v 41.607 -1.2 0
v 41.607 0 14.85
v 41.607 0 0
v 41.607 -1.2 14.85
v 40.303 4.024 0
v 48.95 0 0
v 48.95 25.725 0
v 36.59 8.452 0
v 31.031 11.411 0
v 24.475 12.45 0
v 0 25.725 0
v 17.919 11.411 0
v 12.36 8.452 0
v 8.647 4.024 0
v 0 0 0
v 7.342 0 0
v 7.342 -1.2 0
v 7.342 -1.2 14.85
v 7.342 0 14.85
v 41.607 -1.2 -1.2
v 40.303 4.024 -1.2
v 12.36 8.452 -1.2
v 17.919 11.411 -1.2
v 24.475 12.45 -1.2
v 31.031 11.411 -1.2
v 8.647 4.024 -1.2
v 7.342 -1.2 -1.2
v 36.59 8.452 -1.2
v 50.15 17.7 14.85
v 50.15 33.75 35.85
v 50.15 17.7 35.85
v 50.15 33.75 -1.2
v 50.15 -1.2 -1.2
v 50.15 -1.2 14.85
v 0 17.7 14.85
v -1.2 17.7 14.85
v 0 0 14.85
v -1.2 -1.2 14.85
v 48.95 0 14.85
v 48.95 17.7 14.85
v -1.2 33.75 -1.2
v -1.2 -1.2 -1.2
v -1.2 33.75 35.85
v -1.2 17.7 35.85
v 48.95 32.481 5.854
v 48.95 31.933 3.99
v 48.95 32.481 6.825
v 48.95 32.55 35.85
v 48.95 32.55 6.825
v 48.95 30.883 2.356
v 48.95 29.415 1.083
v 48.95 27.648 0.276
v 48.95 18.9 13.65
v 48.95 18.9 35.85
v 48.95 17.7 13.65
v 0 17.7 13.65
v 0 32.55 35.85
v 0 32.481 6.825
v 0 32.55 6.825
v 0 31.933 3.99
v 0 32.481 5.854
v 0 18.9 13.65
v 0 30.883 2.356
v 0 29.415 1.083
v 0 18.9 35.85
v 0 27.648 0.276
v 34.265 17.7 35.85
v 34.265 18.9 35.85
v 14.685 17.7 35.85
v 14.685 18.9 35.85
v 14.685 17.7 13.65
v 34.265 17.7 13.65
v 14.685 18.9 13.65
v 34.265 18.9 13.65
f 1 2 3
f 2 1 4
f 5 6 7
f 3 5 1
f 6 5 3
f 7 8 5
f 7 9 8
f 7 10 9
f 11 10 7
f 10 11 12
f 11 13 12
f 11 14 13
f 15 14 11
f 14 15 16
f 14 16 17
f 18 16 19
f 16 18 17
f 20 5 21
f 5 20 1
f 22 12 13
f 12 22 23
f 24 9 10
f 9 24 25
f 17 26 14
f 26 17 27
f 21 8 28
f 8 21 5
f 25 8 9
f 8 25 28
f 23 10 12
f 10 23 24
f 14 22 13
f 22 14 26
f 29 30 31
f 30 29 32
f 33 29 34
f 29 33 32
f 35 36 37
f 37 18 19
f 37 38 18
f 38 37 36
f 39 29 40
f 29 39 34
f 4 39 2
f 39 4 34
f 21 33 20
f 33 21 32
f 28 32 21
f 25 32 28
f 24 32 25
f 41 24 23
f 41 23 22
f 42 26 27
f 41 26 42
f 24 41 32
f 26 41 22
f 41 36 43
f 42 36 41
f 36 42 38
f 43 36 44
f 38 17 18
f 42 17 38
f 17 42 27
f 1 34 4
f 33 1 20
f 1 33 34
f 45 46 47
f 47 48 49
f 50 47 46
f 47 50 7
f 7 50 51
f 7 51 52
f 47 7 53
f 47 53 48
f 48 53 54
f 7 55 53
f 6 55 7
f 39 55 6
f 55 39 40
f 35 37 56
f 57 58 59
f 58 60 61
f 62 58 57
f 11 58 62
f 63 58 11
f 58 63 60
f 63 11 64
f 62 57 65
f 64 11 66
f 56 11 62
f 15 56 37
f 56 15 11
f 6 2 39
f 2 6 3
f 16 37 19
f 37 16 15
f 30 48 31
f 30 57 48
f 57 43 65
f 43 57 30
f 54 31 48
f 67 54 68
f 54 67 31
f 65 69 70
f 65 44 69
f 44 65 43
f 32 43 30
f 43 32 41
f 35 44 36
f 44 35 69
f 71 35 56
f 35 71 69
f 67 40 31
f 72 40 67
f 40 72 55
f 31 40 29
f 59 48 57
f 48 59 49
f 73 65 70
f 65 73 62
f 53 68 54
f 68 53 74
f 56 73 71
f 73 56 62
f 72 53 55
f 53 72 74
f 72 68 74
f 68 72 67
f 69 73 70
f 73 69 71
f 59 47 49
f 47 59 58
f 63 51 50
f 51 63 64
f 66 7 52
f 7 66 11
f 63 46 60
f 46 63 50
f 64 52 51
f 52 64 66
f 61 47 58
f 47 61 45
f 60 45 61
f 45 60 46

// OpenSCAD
// What is the length of the cylindrical object being stored OR what is the width you want the dispenser of little thingies to be (mm)?
obj_len = 44.5;

// What is the diameter of each cylindrical object OR what is the size of the little thingies (mm)?
obj_dia = 10.5;

// How many cylinders/thingies tall should the hopper be? The hopper can hold about depth*height cylinders.
hopper_height = 3; // [2:50]

// How many cylinders/thingies deep should the hopper be?
hopper_depth = 1; // [1:15]

// How many cylinders/thingies deep should the tray be?
num_tray = 1; // [1:15]

// How much extra margin do you want around the cylinders/thingies in the Y/Z axes? 
obj_dia_margin_percentage = 30; // [0:100]
obj_dia_margin = obj_dia_margin_percentage/100;

// How much extra margin do you want around the cylinders/thingies in the X axis? 
obj_len_margin_percentage = 10; // [0:100]
obj_len_margin = obj_len_margin_percentage/100;

// Thickness of the walls, increase for more strength but requiring more material (mm). 
wall_thickness = 1.2;

// What percentage of the hopper front should be open? Set to zero if storing little thingies instead of cylinders.
hopper_gap_percentage = 40; // [0:100]
hopper_gap_fraction = hopper_gap_percentage/100;

dip_type = "front_square+bottom_round"; // [front_round,front_square,front_square+bottom_round]

// What percentage of the tray front should have a rounded gap cut out of it? Set to zero if storing little thingies instead of cylinders.
dip_gap_percentage = 70; // [0:100]
dip_gap_fraction = dip_gap_percentage/100;

// dimensions of the empty space (not including walls)
space_w        = obj_len*(1             + obj_len_margin);
space_d_hopper = obj_dia*(hopper_depth  + obj_dia_margin);
space_d_tray   = obj_dia*(num_tray      + obj_dia_margin + 0.5);
space_h_hopper = obj_dia*(hopper_height + obj_dia_margin);
space_h_tray   = obj_dia*(1             + obj_dia_margin);

// make the tray
tray([space_w,space_d_tray,space_h_tray],wall_thickness,dip_gap_fraction);

// make the hopper
translate([0,space_d_tray,0]) hopper([space_w,space_d_hopper,space_h_hopper],wall_thickness,hopper_gap_fraction,space_h_tray);

// render virtual tray cylinders for display purposes
for (i = [0:num_tray-1]) {
    %translate([obj_len*obj_len_margin/2,(obj_dia+obj_dia_margin)*(0.5+i+0.25),(obj_dia+obj_dia_margin)/2]) 
        rotate([0,90,0]) 
        cylinder(d=obj_dia,h=obj_len);
}

// render virtual hopper cylinders for display purposes
translate([0,space_d_tray,0]) {
    for (i = [0:hopper_height-1], j = [0:hopper_depth-1]) {
        %translate([obj_len*obj_len_margin/2,(obj_dia+obj_dia_margin)*(0.5+j),(obj_dia+obj_dia_margin)*(0.5+i)]) 
            rotate([0,90,0]) 
            cylinder(d=obj_dia,h=obj_len);
    }
}




module tray(size,wall_thickness,dip_gap_fraction) {
    difference() {
        translate([-1,-1,-1]*wall_thickness) 
            cube(size + [2,2,2]*wall_thickness);
        cube(size + [0,wall_thickness*2,wall_thickness*2]);
        if (dip_gap_fraction) {
            if (dip_type=="front_round") {
                translate([size[0]/2,wall_thickness/2,size[2]]) 
                    rotate([90,0,0]) 
                    resize([size[0]*dip_gap_fraction, size[2]*2, wall_thickness*2]) 
                    cylinder(h=10,d=10);
                translate([size[0]*(1-dip_gap_fraction)/2,-1.5*wall_thickness,size[2]]) 
                    cube([size[0]*dip_gap_fraction,wall_thickness*2,wall_thickness*2]);
            } else if (dip_type=="front_square") {
                translate([size[0]*(1-dip_gap_fraction)/2,-1.5*wall_thickness,0]) 
                    cube([size[0]*dip_gap_fraction,wall_thickness*2,(size[2])+wall_thickness*2]);
            } else if (dip_type=="front_square+bottom_round") {
                translate([size[0]*(1-dip_gap_fraction)/2,-1.5*wall_thickness,0]) 
                    cube([size[0]*dip_gap_fraction,wall_thickness*2,(size[2])+wall_thickness*2]);
                translate([size[0]/2,-wall_thickness,-wall_thickness*1.5]) 
                    resize([size[0]*dip_gap_fraction, size[2]*2, wall_thickness*2]) 
                    cylinder(h=10,d=10);
            }
        }
    }
}

module hopper(size,wall_thickness,hopper_gap_fraction,tray_gap) {
    difference() {
        translate([-1,-1,-1]*wall_thickness) 
            cube(size + [2,2,2]*wall_thickness);
        cube(size + [0,0,wall_thickness*2]); // main cavity plus open top
        translate([0,-wall_thickness*2,0]) 
            cube([size[0], size[1]+wall_thickness*2,tray_gap]); // bottom slot
        translate([size[0]*(1-hopper_gap_fraction)/2,-wall_thickness*2,0]) 
            cube(
                [size[0]*hopper_gap_fraction,size[1],size[2]] + 
                [0,wall_thickness*2,wall_thickness*2]
            ); // gap in the middle
    }
    // curved back bottom edge
    difference() {
        translate([0,size[1]-tray_gap/2,0]) cube([size[0],tray_gap/2,tray_gap/2]); // cube filling the back region
        translate([0,size[1]-tray_gap/2,tray_gap/2]) rotate([0,90,0]) cylinder(d=tray_gap,h=size[0]); // neg. cylinder carving the curve out
    }
        
}
